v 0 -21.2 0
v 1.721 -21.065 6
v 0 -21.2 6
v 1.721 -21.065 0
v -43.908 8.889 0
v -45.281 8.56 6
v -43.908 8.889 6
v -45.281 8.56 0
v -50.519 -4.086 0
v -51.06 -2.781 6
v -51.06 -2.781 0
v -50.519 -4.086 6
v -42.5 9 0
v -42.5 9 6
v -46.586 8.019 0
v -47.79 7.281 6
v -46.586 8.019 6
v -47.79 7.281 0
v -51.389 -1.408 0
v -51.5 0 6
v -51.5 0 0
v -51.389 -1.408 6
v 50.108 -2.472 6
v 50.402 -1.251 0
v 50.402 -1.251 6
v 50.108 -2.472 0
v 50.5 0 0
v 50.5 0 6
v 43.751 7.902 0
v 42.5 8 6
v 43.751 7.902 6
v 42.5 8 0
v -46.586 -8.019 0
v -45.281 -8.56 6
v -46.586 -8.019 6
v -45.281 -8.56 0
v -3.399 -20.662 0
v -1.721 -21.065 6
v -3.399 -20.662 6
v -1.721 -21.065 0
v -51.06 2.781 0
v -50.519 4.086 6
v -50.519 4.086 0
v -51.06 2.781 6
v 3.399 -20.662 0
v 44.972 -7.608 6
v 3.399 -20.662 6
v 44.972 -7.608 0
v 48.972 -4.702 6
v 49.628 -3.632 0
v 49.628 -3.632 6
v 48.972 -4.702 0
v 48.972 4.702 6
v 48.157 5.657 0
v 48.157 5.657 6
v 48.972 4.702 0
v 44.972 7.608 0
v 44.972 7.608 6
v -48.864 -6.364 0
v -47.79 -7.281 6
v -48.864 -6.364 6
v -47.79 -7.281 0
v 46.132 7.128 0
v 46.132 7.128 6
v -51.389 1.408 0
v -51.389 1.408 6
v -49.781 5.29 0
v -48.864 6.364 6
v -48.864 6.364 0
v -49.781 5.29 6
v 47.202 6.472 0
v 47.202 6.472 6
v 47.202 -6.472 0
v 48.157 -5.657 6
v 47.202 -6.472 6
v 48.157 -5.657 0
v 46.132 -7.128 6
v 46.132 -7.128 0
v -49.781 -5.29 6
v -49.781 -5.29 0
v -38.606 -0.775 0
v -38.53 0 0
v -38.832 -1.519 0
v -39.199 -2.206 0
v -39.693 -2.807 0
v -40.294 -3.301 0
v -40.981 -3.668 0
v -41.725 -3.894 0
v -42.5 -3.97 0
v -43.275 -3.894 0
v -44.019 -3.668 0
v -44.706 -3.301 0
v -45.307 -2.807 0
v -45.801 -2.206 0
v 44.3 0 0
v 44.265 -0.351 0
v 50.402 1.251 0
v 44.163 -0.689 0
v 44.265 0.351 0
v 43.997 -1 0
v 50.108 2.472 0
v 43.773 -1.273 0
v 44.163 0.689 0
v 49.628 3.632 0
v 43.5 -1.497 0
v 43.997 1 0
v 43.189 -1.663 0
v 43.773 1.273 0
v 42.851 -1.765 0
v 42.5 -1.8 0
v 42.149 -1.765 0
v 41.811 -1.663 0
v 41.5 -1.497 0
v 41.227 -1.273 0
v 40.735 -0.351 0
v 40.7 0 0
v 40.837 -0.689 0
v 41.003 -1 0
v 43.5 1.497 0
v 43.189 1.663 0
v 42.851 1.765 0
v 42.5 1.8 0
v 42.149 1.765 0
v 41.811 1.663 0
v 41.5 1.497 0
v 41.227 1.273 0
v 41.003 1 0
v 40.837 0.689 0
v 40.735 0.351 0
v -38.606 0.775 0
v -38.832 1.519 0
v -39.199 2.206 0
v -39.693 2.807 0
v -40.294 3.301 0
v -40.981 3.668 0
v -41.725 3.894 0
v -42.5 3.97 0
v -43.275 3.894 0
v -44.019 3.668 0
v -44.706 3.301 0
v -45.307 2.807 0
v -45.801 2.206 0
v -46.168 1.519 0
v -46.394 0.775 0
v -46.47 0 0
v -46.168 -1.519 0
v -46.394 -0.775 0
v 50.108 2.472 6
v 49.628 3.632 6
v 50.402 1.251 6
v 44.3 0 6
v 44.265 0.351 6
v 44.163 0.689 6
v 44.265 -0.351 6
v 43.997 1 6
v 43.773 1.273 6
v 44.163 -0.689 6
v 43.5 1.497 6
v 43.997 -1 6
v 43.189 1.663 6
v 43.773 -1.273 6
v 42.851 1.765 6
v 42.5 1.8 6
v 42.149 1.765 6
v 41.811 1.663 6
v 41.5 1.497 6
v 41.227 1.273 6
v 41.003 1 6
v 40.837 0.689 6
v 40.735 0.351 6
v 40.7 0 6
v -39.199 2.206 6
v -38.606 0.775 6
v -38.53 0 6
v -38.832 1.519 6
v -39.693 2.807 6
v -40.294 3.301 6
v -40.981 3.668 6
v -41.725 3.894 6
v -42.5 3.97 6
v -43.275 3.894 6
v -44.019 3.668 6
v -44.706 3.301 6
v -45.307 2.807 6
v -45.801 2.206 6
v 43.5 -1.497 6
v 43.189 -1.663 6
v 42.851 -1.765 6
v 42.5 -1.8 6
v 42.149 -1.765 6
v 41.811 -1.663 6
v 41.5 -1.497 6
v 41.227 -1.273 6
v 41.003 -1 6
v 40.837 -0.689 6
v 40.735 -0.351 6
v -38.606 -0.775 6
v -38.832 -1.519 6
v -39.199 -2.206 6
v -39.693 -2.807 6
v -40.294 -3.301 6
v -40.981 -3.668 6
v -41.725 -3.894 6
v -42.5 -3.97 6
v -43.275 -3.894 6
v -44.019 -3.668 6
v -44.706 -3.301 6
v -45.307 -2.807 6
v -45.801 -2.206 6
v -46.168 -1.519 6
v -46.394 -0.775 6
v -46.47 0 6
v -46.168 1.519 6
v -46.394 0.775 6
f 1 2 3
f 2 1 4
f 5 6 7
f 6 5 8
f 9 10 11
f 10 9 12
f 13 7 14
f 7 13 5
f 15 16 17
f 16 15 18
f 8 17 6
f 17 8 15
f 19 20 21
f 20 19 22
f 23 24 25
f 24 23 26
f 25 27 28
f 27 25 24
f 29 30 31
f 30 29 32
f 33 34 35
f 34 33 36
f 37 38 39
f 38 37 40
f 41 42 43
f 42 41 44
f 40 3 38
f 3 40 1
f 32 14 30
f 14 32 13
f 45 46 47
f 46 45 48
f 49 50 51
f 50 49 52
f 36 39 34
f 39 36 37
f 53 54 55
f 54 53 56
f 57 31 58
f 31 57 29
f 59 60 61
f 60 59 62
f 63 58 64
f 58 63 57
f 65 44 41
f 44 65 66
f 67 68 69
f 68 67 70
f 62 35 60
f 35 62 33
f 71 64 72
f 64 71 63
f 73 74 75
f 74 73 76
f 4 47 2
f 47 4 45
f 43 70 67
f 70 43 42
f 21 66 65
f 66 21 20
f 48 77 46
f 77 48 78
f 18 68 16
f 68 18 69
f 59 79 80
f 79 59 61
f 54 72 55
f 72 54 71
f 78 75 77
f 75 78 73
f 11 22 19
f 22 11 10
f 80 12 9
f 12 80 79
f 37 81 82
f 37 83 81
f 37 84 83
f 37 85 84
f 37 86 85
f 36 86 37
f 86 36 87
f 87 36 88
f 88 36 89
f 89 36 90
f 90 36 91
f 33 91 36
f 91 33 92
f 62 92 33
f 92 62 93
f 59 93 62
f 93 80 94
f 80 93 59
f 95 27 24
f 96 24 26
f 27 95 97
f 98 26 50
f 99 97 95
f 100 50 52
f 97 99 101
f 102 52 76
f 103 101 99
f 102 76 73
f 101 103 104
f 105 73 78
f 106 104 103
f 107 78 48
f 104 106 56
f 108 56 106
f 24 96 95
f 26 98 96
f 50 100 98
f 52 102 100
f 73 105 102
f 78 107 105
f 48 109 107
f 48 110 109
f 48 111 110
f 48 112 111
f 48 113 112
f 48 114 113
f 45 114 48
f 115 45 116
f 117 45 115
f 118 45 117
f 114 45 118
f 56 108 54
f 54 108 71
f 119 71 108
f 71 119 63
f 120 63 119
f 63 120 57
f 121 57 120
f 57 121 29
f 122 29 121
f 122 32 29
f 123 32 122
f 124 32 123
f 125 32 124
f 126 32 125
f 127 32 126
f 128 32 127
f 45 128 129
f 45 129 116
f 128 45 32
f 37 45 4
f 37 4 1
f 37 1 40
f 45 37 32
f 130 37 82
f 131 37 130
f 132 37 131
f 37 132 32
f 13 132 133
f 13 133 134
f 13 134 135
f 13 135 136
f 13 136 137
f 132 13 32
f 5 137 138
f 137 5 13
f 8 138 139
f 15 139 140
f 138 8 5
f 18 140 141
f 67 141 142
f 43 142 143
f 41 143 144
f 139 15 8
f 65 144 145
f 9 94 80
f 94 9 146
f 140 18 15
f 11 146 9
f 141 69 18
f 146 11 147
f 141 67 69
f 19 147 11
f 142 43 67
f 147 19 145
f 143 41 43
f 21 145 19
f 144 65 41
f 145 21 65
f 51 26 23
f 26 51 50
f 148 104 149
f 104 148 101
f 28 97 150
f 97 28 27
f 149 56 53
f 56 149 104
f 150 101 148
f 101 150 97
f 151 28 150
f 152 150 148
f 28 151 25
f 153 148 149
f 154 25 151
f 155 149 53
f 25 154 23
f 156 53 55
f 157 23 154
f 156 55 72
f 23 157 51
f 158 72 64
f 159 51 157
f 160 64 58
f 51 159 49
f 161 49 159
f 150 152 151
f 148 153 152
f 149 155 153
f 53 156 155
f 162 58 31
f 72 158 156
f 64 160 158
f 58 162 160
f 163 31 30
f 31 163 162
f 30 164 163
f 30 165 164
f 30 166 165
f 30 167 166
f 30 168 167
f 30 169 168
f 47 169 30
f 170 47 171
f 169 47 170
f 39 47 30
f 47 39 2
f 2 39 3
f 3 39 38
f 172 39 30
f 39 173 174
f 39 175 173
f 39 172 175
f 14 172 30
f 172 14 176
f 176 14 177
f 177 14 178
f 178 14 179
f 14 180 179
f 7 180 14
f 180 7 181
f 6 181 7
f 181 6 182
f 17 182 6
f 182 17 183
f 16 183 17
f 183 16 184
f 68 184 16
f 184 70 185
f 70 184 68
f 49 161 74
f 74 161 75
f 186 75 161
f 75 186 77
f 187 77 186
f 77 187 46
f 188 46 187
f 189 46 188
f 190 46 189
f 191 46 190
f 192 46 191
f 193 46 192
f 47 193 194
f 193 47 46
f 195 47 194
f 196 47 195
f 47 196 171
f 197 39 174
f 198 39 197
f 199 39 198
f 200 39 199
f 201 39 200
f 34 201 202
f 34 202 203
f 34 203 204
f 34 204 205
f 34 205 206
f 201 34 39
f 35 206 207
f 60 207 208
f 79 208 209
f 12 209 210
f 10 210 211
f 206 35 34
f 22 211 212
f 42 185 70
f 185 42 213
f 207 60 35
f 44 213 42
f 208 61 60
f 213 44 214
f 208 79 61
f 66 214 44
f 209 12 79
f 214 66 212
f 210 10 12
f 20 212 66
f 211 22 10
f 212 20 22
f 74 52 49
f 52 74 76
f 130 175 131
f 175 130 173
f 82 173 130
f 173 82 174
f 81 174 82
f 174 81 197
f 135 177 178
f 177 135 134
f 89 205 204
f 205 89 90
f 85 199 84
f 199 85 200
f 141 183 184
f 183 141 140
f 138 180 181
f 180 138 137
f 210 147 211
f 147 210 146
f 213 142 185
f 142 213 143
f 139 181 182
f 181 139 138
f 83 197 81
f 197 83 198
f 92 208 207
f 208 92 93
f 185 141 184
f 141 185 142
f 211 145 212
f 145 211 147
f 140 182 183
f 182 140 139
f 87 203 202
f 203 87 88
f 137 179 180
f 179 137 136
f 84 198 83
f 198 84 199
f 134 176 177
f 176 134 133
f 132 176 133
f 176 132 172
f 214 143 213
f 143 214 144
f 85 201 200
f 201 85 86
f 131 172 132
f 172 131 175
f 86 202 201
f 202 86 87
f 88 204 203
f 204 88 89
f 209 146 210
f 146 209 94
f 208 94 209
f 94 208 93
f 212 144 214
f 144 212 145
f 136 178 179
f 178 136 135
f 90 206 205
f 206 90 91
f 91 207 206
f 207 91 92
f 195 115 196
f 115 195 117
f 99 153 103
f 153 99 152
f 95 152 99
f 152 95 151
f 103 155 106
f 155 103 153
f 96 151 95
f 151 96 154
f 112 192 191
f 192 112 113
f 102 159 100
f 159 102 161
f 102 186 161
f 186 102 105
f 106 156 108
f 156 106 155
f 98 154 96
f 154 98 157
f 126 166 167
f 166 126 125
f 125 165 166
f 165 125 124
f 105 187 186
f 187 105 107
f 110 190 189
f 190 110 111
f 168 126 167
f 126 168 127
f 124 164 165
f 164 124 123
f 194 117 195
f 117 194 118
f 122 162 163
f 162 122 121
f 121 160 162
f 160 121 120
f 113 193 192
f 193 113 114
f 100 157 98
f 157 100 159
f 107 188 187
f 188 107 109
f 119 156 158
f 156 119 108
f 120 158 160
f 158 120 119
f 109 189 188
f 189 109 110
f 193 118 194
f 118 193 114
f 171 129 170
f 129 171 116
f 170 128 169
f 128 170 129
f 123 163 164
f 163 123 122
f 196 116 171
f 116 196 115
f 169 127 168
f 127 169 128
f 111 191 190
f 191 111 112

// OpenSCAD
$fn = 32;

// ----------------------------------------------------------------------
// Lever: 85 mm between the bosses, 6 mm thick, smooth outline
// ----------------------------------------------------------------------

// --- parameters (mm) ---
lever_l = 85;             // distance between the boss centres
boss_a = 18;              // first boss diameter
boss_b = 16;              // second boss diameter
bore_a = 7.94;            // first bore
bore_b = 3.6;             // second bore
lever_t = 6;              // lever thickness
boss_c = 22;              // middle boss diameter
bend = 10.2;              // how far the middle boss drops

lever_profile = [[-51.5, 0], [-51.389, -1.408], [-51.06, -2.781], [-50.519, -4.086], [-49.781, -5.29], [-48.864, -6.364], [-47.79, -7.281], [-46.586, -8.019], [-45.281, -8.56], [-3.399, -20.662], [-1.721, -21.065], [0, -21.2], [1.721, -21.065], [3.399, -20.662], [44.972, -7.608], [46.132, -7.128], [47.202, -6.472], [48.157, -5.657], [48.972, -4.702], [49.628, -3.632], [50.108, -2.472], [50.402, -1.251], [50.5, 0], [50.402, 1.251], [50.108, 2.472], [49.628, 3.632], [48.972, 4.702], [48.157, 5.657], [47.202, 6.472], [46.132, 7.128], [44.972, 7.608], [43.751, 7.902], [42.5, 8], [-42.5, 9], [-43.908, 8.889], [-45.281, 8.56], [-46.586, 8.019], [-47.79, 7.281], [-48.864, 6.364], [-49.781, 5.29], [-50.519, 4.086], [-51.06, 2.781], [-51.389, 1.408]];

difference() {
  linear_extrude(height = lever_t) polygon(lever_profile);
  translate([-42.5, 0, -2.5]) cylinder(h = lever_t + 5, d = bore_a);
  translate([42.5, 0, -2.5]) cylinder(h = lever_t + 5, d = bore_b);
}
